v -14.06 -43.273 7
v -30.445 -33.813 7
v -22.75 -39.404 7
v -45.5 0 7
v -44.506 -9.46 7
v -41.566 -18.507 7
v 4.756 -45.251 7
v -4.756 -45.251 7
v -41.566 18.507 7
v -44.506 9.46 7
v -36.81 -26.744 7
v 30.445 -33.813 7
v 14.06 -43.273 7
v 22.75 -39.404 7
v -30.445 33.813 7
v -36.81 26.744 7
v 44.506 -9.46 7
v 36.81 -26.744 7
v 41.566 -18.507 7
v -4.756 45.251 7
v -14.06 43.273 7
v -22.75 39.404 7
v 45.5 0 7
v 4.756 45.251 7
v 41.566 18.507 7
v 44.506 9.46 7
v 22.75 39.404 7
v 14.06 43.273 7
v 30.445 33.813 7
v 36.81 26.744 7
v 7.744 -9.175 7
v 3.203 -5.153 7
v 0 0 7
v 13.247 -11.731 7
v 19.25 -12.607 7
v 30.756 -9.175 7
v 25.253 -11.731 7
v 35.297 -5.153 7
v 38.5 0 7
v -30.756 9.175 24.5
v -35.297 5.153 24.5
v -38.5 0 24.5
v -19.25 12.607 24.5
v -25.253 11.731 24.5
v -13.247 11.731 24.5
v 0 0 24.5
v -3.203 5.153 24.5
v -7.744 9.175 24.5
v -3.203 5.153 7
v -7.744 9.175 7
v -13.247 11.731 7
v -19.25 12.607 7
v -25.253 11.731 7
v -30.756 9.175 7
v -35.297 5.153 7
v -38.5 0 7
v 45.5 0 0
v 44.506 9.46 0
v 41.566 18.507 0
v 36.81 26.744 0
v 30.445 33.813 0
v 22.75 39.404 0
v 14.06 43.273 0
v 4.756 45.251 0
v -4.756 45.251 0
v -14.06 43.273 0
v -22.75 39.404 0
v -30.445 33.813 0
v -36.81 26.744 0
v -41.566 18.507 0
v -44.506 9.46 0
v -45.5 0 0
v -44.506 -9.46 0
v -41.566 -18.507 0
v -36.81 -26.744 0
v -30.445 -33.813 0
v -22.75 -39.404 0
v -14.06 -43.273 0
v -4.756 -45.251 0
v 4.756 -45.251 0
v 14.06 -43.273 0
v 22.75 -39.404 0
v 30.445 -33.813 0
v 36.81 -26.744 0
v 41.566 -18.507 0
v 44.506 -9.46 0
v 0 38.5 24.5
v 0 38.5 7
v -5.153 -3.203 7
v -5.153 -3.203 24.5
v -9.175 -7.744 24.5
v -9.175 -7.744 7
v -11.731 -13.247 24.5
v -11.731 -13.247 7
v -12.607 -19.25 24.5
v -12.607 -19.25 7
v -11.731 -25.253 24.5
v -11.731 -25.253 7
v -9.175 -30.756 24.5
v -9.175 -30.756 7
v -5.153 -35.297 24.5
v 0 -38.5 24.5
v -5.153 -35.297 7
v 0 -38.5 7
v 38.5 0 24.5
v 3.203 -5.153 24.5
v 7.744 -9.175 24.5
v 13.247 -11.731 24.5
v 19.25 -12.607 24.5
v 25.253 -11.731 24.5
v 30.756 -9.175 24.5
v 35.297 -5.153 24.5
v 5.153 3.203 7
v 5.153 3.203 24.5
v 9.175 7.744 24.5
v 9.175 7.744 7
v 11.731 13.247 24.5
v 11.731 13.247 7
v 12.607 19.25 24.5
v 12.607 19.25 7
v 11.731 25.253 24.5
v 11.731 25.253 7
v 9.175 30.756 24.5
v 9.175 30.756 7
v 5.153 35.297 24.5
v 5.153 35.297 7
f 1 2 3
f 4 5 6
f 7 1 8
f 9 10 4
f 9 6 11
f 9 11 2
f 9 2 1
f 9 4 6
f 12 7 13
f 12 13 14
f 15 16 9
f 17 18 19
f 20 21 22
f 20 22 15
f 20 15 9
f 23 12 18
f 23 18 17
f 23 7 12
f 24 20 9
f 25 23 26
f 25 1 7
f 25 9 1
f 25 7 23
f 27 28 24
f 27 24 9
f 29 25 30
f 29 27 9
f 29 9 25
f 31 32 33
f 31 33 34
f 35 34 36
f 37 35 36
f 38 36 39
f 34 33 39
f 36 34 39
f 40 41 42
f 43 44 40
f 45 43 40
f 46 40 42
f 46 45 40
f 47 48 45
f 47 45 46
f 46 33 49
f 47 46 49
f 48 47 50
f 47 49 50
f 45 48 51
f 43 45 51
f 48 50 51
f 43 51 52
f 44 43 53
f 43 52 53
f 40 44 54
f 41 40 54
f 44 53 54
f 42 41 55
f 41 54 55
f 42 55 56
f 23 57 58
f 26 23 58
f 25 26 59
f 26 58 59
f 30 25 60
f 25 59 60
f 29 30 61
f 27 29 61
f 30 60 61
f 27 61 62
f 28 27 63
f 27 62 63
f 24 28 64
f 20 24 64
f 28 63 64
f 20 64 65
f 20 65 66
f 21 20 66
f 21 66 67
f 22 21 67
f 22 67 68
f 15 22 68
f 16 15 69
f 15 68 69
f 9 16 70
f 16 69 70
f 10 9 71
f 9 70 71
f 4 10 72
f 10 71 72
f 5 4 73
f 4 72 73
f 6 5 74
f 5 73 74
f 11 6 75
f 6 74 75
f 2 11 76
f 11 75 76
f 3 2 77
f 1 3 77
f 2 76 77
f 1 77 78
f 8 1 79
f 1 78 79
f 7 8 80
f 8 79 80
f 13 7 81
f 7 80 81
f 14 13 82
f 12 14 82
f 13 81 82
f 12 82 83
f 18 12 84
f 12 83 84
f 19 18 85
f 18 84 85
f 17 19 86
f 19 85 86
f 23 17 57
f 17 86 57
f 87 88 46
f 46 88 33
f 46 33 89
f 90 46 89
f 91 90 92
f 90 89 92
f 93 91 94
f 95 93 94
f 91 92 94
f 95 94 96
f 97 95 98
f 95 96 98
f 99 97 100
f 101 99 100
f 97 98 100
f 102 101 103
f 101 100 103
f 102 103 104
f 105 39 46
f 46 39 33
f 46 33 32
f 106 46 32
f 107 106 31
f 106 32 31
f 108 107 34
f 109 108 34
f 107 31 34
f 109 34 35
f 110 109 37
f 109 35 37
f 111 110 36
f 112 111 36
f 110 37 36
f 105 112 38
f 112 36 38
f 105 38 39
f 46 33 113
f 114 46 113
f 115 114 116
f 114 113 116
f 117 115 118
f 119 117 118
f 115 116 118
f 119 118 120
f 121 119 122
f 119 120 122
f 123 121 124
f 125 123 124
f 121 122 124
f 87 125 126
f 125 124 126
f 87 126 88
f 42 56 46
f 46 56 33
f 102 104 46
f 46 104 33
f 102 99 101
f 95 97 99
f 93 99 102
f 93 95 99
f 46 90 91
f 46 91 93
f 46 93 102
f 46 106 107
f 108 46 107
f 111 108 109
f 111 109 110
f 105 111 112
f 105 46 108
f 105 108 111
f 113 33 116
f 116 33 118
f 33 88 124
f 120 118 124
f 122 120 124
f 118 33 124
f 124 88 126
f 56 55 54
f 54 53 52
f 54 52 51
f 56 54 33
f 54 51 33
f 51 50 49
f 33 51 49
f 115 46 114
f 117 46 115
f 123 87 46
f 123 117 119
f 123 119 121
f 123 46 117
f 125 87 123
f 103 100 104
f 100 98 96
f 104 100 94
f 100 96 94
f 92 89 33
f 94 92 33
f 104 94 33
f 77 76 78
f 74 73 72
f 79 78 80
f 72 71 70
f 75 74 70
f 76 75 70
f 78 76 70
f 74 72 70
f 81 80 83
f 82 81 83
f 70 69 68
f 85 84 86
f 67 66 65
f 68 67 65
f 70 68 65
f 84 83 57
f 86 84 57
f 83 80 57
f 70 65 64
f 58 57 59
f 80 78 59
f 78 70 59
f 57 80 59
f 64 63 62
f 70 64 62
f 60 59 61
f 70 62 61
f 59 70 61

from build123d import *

# Parameters (mm, degrees)
F0_R     = 65
F1_DEPTH = 10
F3_DEPTH = 25
F4_SCALE = 0.7


with BuildPart() as f1:
    # F0 (on Top) → F1 (new body)
    with BuildSketch(Plane.XY):
        Circle(F0_R)
    extrude(amount=F1_DEPTH)


with BuildPart() as f3:
    # F2 (on face) → F3 (new body)
    with BuildSketch(Plane.XY.offset(10)):
        with BuildLine():
            Line((0, 55), (0, 0))
            ThreePointArc((0, 0), (18.0104211917, 27.5), (0, 55))
        make_face()
    extrude(amount=F3_DEPTH)


with BuildPart() as f3b:
    # F2 (on face) → F3, piece 2 (new body)
    with BuildSketch(Plane.XY.offset(10)):
        with BuildLine():
            Line((55, 0), (0, 0))
            ThreePointArc((0, 0), (27.5, -18.0104211917), (55, 0))
        make_face()
    extrude(amount=F3_DEPTH)


with BuildPart() as f3c:
    # F2 (on face) → F3, piece 3 (new body)
    with BuildSketch(Plane.XY.offset(10)):
        with BuildLine():
            Line((0, -55), (0, 0))
            ThreePointArc((0, 0), (-18.0104211917, -27.5), (0, -55))
        make_face()
    extrude(amount=F3_DEPTH)


with BuildPart() as f3d:
    # F2 (on face) → F3, piece 4 (new body)
    with BuildSketch(Plane.XY.offset(10)):
        with BuildLine():
            Line((-55, 0), (0, 0))
            ThreePointArc((0, 0), (-27.5, 18.0104211917), (-55, 0))
        make_face()
    extrude(amount=F3_DEPTH)


with BuildPart() as f1_1:
    # F4: moved
    add(f1.part.scale(F4_SCALE))


with BuildPart() as f3_1:
    # F4: moved
    add(f3.part.scale(F4_SCALE))


with BuildPart() as f3b_1:
    # F4: moved
    add(f3b.part.scale(F4_SCALE))


with BuildPart() as f3c_1:
    # F4: moved
    add(f3c.part.scale(F4_SCALE))


with BuildPart() as f3d_1:
    # F4: moved
    add(f3d.part.scale(F4_SCALE))


solid = Compound([f1_1.part, f3_1.part, f3b_1.part, f3c_1.part, f3d_1.part])
